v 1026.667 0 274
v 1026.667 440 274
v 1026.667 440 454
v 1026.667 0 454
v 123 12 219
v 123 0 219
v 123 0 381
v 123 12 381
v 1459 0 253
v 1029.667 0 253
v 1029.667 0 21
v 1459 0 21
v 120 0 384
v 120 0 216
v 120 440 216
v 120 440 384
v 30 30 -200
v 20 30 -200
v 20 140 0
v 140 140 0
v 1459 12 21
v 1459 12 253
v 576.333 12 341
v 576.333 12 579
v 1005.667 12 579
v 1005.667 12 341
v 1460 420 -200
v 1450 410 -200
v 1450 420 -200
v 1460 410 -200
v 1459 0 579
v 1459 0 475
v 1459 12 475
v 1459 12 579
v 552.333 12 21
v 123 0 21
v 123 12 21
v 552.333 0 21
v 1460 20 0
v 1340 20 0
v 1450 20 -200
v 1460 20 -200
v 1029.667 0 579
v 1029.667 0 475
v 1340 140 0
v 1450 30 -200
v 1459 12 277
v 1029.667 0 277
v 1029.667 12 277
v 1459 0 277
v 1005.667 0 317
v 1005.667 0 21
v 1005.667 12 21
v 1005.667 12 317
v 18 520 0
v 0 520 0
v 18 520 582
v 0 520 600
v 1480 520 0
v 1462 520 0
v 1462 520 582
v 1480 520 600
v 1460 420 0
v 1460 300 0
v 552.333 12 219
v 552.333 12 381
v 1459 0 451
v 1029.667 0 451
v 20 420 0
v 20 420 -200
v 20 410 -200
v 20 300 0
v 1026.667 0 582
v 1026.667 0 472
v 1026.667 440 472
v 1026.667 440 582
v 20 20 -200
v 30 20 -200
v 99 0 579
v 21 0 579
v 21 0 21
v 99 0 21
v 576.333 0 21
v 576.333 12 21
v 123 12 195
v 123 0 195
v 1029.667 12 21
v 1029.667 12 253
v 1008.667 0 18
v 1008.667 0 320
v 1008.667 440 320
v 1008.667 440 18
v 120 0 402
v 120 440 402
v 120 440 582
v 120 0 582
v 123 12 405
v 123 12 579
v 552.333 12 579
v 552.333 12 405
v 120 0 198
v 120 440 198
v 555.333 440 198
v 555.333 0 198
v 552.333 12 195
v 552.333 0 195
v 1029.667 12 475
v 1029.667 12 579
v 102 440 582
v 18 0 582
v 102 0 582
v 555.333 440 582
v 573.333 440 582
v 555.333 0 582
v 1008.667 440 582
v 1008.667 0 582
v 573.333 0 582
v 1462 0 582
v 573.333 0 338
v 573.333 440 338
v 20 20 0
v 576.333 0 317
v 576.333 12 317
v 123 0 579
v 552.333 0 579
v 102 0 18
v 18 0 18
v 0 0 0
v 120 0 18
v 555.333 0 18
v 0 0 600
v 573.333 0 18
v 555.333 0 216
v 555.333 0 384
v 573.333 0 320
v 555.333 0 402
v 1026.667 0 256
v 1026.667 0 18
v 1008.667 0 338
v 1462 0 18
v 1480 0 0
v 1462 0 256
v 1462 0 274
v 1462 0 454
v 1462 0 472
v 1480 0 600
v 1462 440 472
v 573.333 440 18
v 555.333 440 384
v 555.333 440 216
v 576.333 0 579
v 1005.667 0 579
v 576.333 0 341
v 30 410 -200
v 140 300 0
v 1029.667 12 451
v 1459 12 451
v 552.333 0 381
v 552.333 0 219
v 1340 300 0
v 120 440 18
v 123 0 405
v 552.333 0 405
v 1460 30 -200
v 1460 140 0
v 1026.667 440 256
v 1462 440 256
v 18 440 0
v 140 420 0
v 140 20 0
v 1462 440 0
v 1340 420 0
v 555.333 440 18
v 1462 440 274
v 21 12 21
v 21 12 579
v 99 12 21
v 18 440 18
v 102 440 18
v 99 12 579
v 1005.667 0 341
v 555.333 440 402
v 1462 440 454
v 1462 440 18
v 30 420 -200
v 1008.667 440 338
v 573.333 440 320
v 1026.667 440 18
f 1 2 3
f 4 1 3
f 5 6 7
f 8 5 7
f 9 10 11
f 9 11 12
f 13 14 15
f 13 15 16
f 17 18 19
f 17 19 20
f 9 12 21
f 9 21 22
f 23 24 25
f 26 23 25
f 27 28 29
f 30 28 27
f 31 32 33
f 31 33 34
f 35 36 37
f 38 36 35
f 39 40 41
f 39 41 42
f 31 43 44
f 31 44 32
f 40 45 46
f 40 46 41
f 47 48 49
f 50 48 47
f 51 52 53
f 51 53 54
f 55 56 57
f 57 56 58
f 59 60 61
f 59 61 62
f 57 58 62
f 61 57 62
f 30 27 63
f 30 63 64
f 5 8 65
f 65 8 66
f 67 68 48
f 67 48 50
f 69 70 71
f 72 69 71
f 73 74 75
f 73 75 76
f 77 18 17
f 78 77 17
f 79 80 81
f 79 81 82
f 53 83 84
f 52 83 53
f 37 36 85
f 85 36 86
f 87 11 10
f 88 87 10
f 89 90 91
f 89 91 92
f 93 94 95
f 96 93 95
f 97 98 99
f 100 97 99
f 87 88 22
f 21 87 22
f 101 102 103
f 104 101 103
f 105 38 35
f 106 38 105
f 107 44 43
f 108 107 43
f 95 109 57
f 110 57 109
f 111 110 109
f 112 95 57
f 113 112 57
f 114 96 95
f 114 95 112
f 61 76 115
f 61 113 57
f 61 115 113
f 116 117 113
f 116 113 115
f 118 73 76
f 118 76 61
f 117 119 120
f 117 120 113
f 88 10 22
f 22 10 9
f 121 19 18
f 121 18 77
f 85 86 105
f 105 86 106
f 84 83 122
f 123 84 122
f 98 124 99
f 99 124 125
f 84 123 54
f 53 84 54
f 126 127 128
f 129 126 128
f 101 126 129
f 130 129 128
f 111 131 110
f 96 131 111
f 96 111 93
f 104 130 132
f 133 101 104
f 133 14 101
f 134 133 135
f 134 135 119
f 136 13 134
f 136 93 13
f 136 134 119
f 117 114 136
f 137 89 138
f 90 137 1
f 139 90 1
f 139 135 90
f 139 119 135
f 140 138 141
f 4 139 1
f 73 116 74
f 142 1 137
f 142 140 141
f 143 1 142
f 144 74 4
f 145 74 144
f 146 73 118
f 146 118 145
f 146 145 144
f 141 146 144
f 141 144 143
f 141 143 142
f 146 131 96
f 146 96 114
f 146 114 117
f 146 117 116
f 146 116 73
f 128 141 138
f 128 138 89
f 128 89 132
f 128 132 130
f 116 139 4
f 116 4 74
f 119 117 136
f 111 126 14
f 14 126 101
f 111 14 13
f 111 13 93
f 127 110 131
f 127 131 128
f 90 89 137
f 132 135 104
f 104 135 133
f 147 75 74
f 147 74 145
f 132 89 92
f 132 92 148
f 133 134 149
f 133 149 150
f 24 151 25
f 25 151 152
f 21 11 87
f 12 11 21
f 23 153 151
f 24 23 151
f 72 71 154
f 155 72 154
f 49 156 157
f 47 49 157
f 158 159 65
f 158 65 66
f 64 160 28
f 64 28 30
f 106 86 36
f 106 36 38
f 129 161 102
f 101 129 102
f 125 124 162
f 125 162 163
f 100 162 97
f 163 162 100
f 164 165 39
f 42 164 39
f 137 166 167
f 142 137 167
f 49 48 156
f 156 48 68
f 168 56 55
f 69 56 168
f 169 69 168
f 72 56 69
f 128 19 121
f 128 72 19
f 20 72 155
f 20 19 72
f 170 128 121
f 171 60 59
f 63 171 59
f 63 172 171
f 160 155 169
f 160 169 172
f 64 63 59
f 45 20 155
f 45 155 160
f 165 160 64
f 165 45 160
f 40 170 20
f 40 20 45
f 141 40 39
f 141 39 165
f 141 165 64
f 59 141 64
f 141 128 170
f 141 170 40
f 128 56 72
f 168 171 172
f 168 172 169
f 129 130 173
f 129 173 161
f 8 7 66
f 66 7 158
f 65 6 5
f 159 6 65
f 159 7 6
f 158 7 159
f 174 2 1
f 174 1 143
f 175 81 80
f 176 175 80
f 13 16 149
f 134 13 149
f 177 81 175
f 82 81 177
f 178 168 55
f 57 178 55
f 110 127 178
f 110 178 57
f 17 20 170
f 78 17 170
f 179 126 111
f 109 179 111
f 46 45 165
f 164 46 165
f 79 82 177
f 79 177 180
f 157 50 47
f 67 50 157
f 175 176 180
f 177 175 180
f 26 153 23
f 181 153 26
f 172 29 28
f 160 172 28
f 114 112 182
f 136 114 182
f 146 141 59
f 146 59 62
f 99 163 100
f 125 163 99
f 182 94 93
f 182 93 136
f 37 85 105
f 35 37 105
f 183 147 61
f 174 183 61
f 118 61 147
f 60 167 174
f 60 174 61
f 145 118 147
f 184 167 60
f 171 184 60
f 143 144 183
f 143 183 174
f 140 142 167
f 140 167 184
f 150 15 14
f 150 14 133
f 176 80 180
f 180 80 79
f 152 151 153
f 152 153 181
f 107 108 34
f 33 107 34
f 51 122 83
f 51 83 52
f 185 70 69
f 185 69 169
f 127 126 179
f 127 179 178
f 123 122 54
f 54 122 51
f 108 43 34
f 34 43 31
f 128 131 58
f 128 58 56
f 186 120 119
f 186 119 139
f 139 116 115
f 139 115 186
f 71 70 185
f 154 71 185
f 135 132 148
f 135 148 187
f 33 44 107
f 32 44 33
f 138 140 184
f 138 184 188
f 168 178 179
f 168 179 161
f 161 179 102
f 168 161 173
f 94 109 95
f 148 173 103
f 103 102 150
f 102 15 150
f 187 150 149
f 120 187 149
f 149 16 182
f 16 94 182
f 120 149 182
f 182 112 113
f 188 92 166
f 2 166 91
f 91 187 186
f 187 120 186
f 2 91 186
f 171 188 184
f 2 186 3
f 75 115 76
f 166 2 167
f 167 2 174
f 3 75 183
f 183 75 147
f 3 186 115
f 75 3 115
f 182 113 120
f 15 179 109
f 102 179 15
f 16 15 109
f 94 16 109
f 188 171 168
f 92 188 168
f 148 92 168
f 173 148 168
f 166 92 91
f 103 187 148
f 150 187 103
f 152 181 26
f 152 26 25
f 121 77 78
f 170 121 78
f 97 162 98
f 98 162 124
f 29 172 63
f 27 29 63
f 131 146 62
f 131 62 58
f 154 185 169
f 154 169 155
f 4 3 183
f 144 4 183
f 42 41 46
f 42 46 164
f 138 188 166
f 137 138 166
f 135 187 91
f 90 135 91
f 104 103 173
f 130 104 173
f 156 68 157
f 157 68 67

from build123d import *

# Parameters (mm, degrees)
F2_W        = 18
F2_H        = 564
F2_H_2      = 18
F2_W_2      = 84
F2_W_3      = 9
F2_W_4      = 435.3333333333
F3_DEPTH    = 520
F4_DEPTH    = 440
F5_W        = 78
F5_H        = 558
F6_DEPTH    = 12
F5_W_2      = 429.3333333333
F5_H_2      = 174
F5_H_3      = 162
F5_H_4      = 238
F5_H_5      = 296
F5_H_6      = 232
F5_H_7      = 104
F7_W        = 120
F7_H        = 120
F8_DEPTH    = 200
F9_SIZE2    = 109.99999
F9_SIZE     = 199.99999
F9_2_SIZE2  = 109.99999
F9_2_SIZE   = 199.99999
F10_SIZE2   = 199.99999
F10_SIZE    = 109.99999
F10_2_SIZE2 = 199.99999
F10_2_SIZE  = 109.99999
F11_SIZE2   = 109.99999
F11_SIZE    = 199.99999
F11_2_SIZE2 = 109.99999
F11_2_SIZE  = 199.99999
F12_SIZE2   = 109.99999
F12_SIZE    = 199.99999
F12_2_SIZE2 = 109.99999
F12_2_SIZE  = 199.99999


# Not quite as in the source:
# - a fillet or chamfer is up to 0.001 mm smaller than in the source, because OpenCascade refuses the exact size


with BuildPart() as f3:
    # F2 (on Front) → F3 (new body)
    with BuildSketch(Plane.XZ):
        with Locations((9, 300)):
            Rectangle(F2_W, F2_H)
        with Locations((9, 591)):
            Rectangle(F2_W, F2_H_2)
        with Locations((60, 591)):
            Rectangle(F2_W_2, F2_H_2)
        with Locations((115.5, 591)):
            Rectangle(F2_W_3, F2_H_2)
        with Locations((337.6666666667, 591)):
            Rectangle(F2_W_4, F2_H_2)
        with Locations((559.8333333333, 591)):
            Rectangle(F2_W_3, F2_H_2)
        with Locations((568.8333333333, 591)):
            Rectangle(F2_W_3, F2_H_2)
        with Locations((791, 591)):
            Rectangle(F2_W_4, F2_H_2)
        with Locations((1013.1666666667, 591)):
            Rectangle(F2_W_3, F2_H_2)
        with Locations((1022.1666666667, 591)):
            Rectangle(F2_W_3, F2_H_2)
        with Locations((1244.3333333333, 591)):
            Rectangle(F2_W_4, F2_H_2)
        with Locations((1475.5, 591)):
            Rectangle(F2_W_3, F2_H_2)
        with Locations((1475.5, 300)):
            Rectangle(F2_W_3, F2_H)
        with Locations((1475.5, 9)):
            Rectangle(F2_W_3, F2_H_2)
        with Locations((9, 9)):
            Rectangle(F2_W, F2_H_2)
        with Locations((106.5, 591)):
            Rectangle(F2_W_3, F2_H_2)
        with Locations((1466.5, 591)):
            Rectangle(F2_W_3, F2_H_2)
        Polygon((1462, 256), (1462, 18), (1471, 18), (1471, 582), (1462, 582), (1462, 472), (1462, 454), (1462, 274), align=None)
        with Locations((1466.5, 9)):
            Rectangle(F2_W_3, F2_H_2)
    extrude(amount=-F3_DEPTH)

    # F2 (on Front) → F4 (join)
    with BuildSketch(Plane.XZ):
        with Locations((1244.3333333333, 9)):
            Rectangle(F2_W_4, F2_H_2)
        with Locations((1022.1666666667, 9)):
            Rectangle(F2_W_3, F2_H_2)
        with Locations((1013.1666666667, 9)):
            Rectangle(F2_W_3, F2_H_2)
        with Locations((791, 9)):
            Rectangle(F2_W_4, F2_H_2)
        with Locations((568.8333333333, 9)):
            Rectangle(F2_W_3, F2_H_2)
        with Locations((559.8333333333, 9)):
            Rectangle(F2_W_3, F2_H_2)
        with Locations((337.6666666667, 9)):
            Rectangle(F2_W_4, F2_H_2)
        with Locations((115.5, 9)):
            Rectangle(F2_W_3, F2_H_2)
        with Locations((60, 9)):
            Rectangle(F2_W_2, F2_H_2)
        Polygon((111, 582), (111, 18), (120, 18), (120, 198), (120, 216), (120, 384), (120, 402), (120, 582), align=None)
        Polygon((555.3333333333, 198), (555.3333333333, 18), (564.3333333333, 18), (564.3333333333, 582), (555.3333333333, 582), (555.3333333333, 402), (555.3333333333, 384), (555.3333333333, 216), align=None)
        Polygon((564.3333333333, 582), (564.3333333333, 18), (573.3333333333, 18), (573.3333333333, 320), (573.3333333333, 338), (573.3333333333, 582), align=None)
        Polygon((1008.6666666667, 320), (1008.6666666667, 18), (1017.6666666667, 18), (1017.6666666667, 582), (1008.6666666667, 582), (1008.6666666667, 338), align=None)
        Polygon((1017.6666666667, 582), (1017.6666666667, 18), (1026.6666666667, 18), (1026.6666666667, 256), (1026.6666666667, 274), (1026.6666666667, 454), (1026.6666666667, 472), (1026.6666666667, 582), align=None)
        with Locations((106.5, 9)):
            Rectangle(F2_W_3, F2_H_2)
        with Locations((106.5, 300)):
            Rectangle(F2_W_3, F2_H)
        with Locations((337.6666666667, 393)):
            Rectangle(F2_W_4, F2_H_2)
        with Locations((337.6666666667, 207)):
            Rectangle(F2_W_4, F2_H_2)
        with Locations((791, 329)):
            Rectangle(F2_W_4, F2_H_2)
        with Locations((1244.3333333333, 463)):
            Rectangle(F2_W_4, F2_H_2)
        with Locations((1244.3333333333, 265)):
            Rectangle(F2_W_4, F2_H_2)
    extrude(amount=-F4_DEPTH)

    # F7 (on face) → F8 (join)
    with BuildSketch(Plane(origin=(0, 0, 0), x_dir=(1, 0, 0), z_dir=(0, 0, -1))):
        with Locations((80, -80)):
            Rectangle(F7_W, F7_H)
        with Locations((1400, -80)):
            Rectangle(F7_W, F7_H)
        with Locations((80, -360)):
            Rectangle(F7_W, F7_H)
        with Locations((1400, -360)):
            Rectangle(F7_W, F7_H)
    extrude(amount=F8_DEPTH)

    # F9 (size 200 and 110 in the source; OpenCascade refuses exactly that, so slightly less here)
    f9_edges = [f3.edges().sort_by_distance(p)[0] for p in [
        (140, 80, -200),
    ]]
    f9_side = f3.faces().sort_by_distance((140, 80, -100))[0]
    chamfer(f9_edges, length=F9_SIZE, length2=F9_SIZE2, reference=f9_side)

    # F9#2 (size 200 and 110 in the source; OpenCascade refuses exactly that, so slightly less here)
    f9_2_edges = [f3.edges().sort_by_distance(p)[0] for p in [
        (1340, 360, -200),
    ]]
    f9_2_side = f3.faces().sort_by_distance((1340, 360, -100))[0]
    chamfer(f9_2_edges, length=F9_2_SIZE, length2=F9_2_SIZE2, reference=f9_2_side)

    # F10 (size 110 and 200 in the source; OpenCascade refuses exactly that, so slightly less here)
    f10_edges = [f3.edges().sort_by_distance(p)[0] for p in [
        (25.000005, 140, -200),
    ]]
    f10_side = f3.faces().sort_by_distance((25.000005, 80, -200))[0]
    chamfer(f10_edges, length=F10_SIZE, length2=F10_SIZE2, reference=f10_side)

    # F10#2 (size 110 and 200 in the source; OpenCascade refuses exactly that, so slightly less here)
    f10_2_edges = [f3.edges().sort_by_distance(p)[0] for p in [
        (1454.999995, 300, -200),
    ]]
    f10_2_side = f3.faces().sort_by_distance((1454.999995, 360, -200))[0]
    chamfer(f10_2_edges, length=F10_2_SIZE, length2=F10_2_SIZE2, reference=f10_2_side)

    # F11 (size 200 and 110 in the source; OpenCascade refuses exactly that, so slightly less here)
    f11_edges = [f3.edges().sort_by_distance(p)[0] for p in [
        (140, 360, -200),
    ]]
    f11_side = f3.faces().sort_by_distance((140, 360, -100))[0]
    chamfer(f11_edges, length=F11_SIZE, length2=F11_SIZE2, reference=f11_side)

    # F11#2 (size 200 and 110 in the source; OpenCascade refuses exactly that, so slightly less here)
    f11_2_edges = [f3.edges().sort_by_distance(p)[0] for p in [
        (1340, 80, -200),
    ]]
    f11_2_side = f3.faces().sort_by_distance((1340, 80, -100))[0]
    chamfer(f11_2_edges, length=F11_2_SIZE, length2=F11_2_SIZE2, reference=f11_2_side)

    # F12 (size 200 and 110 in the source; OpenCascade refuses exactly that, so slightly less here)
    f12_edges = [f3.edges().sort_by_distance(p)[0] for p in [
        (25.000005, 300, -200),
    ]]
    f12_side = f3.faces().sort_by_distance((60.256413, 300, -71.794876))[0]
    chamfer(f12_edges, length=F12_SIZE, length2=F12_SIZE2, reference=f12_side)

    # F12#2 (size 200 and 110 in the source; OpenCascade refuses exactly that, so slightly less here)
    f12_2_edges = [f3.edges().sort_by_distance(p)[0] for p in [
        (1454.999995, 140, -200),
    ]]
    f12_2_side = f3.faces().sort_by_distance((1419.743587, 140, -71.794876))[0]
    chamfer(f12_2_edges, length=F12_2_SIZE, length2=F12_2_SIZE2, reference=f12_2_side)


with BuildPart() as f6:
    # F5 (on Front) → F6 (new body)
    with BuildSketch(Plane.XZ):
        with Locations((60, 300)):
            Rectangle(F5_W, F5_H)
    extrude(amount=-F6_DEPTH)


with BuildPart() as f6b:
    # F5 (on Front) → F6, piece 2 (new body)
    with BuildSketch(Plane.XZ):
        with Locations((337.6666666667, 492)):
            Rectangle(F5_W_2, F5_H_2)
    extrude(amount=-F6_DEPTH)


with BuildPart() as f6c:
    # F5 (on Front) → F6, piece 3 (new body)
    with BuildSketch(Plane.XZ):
        with Locations((337.6666666667, 300)):
            Rectangle(F5_W_2, F5_H_3)
    extrude(amount=-F6_DEPTH)


with BuildPart() as f6d:
    # F5 (on Front) → F6, piece 4 (new body)
    with BuildSketch(Plane.XZ):
        with Locations((337.6666666667, 108)):
            Rectangle(F5_W_2, F5_H_2)
    extrude(amount=-F6_DEPTH)


with BuildPart() as f6e:
    # F5 (on Front) → F6, piece 5 (new body)
    with BuildSketch(Plane.XZ):
        with Locations((791, 460)):
            Rectangle(F5_W_2, F5_H_4)
    extrude(amount=-F6_DEPTH)


with BuildPart() as f6f:
    # F5 (on Front) → F6, piece 6 (new body)
    with BuildSketch(Plane.XZ):
        with Locations((791, 169)):
            Rectangle(F5_W_2, F5_H_5)
    extrude(amount=-F6_DEPTH)


with BuildPart() as f6g:
    # F5 (on Front) → F6, piece 7 (new body)
    with BuildSketch(Plane.XZ):
        with Locations((1244.3333333333, 137)):
            Rectangle(F5_W_2, F5_H_6)
    extrude(amount=-F6_DEPTH)


with BuildPart() as f6h:
    # F5 (on Front) → F6, piece 8 (new body)
    with BuildSketch(Plane.XZ):
        with Locations((1244.3333333333, 364)):
            Rectangle(F5_W_2, F5_H_2)
    extrude(amount=-F6_DEPTH)


with BuildPart() as f6i:
    # F5 (on Front) → F6, piece 9 (new body)
    with BuildSketch(Plane.XZ):
        with Locations((1244.3333333333, 527)):
            Rectangle(F5_W_2, F5_H_7)
    extrude(amount=-F6_DEPTH)


solid = Compound([f3.part, f6.part, f6b.part, f6c.part, f6d.part, f6e.part, f6f.part, f6g.part, f6h.part, f6i.part])
